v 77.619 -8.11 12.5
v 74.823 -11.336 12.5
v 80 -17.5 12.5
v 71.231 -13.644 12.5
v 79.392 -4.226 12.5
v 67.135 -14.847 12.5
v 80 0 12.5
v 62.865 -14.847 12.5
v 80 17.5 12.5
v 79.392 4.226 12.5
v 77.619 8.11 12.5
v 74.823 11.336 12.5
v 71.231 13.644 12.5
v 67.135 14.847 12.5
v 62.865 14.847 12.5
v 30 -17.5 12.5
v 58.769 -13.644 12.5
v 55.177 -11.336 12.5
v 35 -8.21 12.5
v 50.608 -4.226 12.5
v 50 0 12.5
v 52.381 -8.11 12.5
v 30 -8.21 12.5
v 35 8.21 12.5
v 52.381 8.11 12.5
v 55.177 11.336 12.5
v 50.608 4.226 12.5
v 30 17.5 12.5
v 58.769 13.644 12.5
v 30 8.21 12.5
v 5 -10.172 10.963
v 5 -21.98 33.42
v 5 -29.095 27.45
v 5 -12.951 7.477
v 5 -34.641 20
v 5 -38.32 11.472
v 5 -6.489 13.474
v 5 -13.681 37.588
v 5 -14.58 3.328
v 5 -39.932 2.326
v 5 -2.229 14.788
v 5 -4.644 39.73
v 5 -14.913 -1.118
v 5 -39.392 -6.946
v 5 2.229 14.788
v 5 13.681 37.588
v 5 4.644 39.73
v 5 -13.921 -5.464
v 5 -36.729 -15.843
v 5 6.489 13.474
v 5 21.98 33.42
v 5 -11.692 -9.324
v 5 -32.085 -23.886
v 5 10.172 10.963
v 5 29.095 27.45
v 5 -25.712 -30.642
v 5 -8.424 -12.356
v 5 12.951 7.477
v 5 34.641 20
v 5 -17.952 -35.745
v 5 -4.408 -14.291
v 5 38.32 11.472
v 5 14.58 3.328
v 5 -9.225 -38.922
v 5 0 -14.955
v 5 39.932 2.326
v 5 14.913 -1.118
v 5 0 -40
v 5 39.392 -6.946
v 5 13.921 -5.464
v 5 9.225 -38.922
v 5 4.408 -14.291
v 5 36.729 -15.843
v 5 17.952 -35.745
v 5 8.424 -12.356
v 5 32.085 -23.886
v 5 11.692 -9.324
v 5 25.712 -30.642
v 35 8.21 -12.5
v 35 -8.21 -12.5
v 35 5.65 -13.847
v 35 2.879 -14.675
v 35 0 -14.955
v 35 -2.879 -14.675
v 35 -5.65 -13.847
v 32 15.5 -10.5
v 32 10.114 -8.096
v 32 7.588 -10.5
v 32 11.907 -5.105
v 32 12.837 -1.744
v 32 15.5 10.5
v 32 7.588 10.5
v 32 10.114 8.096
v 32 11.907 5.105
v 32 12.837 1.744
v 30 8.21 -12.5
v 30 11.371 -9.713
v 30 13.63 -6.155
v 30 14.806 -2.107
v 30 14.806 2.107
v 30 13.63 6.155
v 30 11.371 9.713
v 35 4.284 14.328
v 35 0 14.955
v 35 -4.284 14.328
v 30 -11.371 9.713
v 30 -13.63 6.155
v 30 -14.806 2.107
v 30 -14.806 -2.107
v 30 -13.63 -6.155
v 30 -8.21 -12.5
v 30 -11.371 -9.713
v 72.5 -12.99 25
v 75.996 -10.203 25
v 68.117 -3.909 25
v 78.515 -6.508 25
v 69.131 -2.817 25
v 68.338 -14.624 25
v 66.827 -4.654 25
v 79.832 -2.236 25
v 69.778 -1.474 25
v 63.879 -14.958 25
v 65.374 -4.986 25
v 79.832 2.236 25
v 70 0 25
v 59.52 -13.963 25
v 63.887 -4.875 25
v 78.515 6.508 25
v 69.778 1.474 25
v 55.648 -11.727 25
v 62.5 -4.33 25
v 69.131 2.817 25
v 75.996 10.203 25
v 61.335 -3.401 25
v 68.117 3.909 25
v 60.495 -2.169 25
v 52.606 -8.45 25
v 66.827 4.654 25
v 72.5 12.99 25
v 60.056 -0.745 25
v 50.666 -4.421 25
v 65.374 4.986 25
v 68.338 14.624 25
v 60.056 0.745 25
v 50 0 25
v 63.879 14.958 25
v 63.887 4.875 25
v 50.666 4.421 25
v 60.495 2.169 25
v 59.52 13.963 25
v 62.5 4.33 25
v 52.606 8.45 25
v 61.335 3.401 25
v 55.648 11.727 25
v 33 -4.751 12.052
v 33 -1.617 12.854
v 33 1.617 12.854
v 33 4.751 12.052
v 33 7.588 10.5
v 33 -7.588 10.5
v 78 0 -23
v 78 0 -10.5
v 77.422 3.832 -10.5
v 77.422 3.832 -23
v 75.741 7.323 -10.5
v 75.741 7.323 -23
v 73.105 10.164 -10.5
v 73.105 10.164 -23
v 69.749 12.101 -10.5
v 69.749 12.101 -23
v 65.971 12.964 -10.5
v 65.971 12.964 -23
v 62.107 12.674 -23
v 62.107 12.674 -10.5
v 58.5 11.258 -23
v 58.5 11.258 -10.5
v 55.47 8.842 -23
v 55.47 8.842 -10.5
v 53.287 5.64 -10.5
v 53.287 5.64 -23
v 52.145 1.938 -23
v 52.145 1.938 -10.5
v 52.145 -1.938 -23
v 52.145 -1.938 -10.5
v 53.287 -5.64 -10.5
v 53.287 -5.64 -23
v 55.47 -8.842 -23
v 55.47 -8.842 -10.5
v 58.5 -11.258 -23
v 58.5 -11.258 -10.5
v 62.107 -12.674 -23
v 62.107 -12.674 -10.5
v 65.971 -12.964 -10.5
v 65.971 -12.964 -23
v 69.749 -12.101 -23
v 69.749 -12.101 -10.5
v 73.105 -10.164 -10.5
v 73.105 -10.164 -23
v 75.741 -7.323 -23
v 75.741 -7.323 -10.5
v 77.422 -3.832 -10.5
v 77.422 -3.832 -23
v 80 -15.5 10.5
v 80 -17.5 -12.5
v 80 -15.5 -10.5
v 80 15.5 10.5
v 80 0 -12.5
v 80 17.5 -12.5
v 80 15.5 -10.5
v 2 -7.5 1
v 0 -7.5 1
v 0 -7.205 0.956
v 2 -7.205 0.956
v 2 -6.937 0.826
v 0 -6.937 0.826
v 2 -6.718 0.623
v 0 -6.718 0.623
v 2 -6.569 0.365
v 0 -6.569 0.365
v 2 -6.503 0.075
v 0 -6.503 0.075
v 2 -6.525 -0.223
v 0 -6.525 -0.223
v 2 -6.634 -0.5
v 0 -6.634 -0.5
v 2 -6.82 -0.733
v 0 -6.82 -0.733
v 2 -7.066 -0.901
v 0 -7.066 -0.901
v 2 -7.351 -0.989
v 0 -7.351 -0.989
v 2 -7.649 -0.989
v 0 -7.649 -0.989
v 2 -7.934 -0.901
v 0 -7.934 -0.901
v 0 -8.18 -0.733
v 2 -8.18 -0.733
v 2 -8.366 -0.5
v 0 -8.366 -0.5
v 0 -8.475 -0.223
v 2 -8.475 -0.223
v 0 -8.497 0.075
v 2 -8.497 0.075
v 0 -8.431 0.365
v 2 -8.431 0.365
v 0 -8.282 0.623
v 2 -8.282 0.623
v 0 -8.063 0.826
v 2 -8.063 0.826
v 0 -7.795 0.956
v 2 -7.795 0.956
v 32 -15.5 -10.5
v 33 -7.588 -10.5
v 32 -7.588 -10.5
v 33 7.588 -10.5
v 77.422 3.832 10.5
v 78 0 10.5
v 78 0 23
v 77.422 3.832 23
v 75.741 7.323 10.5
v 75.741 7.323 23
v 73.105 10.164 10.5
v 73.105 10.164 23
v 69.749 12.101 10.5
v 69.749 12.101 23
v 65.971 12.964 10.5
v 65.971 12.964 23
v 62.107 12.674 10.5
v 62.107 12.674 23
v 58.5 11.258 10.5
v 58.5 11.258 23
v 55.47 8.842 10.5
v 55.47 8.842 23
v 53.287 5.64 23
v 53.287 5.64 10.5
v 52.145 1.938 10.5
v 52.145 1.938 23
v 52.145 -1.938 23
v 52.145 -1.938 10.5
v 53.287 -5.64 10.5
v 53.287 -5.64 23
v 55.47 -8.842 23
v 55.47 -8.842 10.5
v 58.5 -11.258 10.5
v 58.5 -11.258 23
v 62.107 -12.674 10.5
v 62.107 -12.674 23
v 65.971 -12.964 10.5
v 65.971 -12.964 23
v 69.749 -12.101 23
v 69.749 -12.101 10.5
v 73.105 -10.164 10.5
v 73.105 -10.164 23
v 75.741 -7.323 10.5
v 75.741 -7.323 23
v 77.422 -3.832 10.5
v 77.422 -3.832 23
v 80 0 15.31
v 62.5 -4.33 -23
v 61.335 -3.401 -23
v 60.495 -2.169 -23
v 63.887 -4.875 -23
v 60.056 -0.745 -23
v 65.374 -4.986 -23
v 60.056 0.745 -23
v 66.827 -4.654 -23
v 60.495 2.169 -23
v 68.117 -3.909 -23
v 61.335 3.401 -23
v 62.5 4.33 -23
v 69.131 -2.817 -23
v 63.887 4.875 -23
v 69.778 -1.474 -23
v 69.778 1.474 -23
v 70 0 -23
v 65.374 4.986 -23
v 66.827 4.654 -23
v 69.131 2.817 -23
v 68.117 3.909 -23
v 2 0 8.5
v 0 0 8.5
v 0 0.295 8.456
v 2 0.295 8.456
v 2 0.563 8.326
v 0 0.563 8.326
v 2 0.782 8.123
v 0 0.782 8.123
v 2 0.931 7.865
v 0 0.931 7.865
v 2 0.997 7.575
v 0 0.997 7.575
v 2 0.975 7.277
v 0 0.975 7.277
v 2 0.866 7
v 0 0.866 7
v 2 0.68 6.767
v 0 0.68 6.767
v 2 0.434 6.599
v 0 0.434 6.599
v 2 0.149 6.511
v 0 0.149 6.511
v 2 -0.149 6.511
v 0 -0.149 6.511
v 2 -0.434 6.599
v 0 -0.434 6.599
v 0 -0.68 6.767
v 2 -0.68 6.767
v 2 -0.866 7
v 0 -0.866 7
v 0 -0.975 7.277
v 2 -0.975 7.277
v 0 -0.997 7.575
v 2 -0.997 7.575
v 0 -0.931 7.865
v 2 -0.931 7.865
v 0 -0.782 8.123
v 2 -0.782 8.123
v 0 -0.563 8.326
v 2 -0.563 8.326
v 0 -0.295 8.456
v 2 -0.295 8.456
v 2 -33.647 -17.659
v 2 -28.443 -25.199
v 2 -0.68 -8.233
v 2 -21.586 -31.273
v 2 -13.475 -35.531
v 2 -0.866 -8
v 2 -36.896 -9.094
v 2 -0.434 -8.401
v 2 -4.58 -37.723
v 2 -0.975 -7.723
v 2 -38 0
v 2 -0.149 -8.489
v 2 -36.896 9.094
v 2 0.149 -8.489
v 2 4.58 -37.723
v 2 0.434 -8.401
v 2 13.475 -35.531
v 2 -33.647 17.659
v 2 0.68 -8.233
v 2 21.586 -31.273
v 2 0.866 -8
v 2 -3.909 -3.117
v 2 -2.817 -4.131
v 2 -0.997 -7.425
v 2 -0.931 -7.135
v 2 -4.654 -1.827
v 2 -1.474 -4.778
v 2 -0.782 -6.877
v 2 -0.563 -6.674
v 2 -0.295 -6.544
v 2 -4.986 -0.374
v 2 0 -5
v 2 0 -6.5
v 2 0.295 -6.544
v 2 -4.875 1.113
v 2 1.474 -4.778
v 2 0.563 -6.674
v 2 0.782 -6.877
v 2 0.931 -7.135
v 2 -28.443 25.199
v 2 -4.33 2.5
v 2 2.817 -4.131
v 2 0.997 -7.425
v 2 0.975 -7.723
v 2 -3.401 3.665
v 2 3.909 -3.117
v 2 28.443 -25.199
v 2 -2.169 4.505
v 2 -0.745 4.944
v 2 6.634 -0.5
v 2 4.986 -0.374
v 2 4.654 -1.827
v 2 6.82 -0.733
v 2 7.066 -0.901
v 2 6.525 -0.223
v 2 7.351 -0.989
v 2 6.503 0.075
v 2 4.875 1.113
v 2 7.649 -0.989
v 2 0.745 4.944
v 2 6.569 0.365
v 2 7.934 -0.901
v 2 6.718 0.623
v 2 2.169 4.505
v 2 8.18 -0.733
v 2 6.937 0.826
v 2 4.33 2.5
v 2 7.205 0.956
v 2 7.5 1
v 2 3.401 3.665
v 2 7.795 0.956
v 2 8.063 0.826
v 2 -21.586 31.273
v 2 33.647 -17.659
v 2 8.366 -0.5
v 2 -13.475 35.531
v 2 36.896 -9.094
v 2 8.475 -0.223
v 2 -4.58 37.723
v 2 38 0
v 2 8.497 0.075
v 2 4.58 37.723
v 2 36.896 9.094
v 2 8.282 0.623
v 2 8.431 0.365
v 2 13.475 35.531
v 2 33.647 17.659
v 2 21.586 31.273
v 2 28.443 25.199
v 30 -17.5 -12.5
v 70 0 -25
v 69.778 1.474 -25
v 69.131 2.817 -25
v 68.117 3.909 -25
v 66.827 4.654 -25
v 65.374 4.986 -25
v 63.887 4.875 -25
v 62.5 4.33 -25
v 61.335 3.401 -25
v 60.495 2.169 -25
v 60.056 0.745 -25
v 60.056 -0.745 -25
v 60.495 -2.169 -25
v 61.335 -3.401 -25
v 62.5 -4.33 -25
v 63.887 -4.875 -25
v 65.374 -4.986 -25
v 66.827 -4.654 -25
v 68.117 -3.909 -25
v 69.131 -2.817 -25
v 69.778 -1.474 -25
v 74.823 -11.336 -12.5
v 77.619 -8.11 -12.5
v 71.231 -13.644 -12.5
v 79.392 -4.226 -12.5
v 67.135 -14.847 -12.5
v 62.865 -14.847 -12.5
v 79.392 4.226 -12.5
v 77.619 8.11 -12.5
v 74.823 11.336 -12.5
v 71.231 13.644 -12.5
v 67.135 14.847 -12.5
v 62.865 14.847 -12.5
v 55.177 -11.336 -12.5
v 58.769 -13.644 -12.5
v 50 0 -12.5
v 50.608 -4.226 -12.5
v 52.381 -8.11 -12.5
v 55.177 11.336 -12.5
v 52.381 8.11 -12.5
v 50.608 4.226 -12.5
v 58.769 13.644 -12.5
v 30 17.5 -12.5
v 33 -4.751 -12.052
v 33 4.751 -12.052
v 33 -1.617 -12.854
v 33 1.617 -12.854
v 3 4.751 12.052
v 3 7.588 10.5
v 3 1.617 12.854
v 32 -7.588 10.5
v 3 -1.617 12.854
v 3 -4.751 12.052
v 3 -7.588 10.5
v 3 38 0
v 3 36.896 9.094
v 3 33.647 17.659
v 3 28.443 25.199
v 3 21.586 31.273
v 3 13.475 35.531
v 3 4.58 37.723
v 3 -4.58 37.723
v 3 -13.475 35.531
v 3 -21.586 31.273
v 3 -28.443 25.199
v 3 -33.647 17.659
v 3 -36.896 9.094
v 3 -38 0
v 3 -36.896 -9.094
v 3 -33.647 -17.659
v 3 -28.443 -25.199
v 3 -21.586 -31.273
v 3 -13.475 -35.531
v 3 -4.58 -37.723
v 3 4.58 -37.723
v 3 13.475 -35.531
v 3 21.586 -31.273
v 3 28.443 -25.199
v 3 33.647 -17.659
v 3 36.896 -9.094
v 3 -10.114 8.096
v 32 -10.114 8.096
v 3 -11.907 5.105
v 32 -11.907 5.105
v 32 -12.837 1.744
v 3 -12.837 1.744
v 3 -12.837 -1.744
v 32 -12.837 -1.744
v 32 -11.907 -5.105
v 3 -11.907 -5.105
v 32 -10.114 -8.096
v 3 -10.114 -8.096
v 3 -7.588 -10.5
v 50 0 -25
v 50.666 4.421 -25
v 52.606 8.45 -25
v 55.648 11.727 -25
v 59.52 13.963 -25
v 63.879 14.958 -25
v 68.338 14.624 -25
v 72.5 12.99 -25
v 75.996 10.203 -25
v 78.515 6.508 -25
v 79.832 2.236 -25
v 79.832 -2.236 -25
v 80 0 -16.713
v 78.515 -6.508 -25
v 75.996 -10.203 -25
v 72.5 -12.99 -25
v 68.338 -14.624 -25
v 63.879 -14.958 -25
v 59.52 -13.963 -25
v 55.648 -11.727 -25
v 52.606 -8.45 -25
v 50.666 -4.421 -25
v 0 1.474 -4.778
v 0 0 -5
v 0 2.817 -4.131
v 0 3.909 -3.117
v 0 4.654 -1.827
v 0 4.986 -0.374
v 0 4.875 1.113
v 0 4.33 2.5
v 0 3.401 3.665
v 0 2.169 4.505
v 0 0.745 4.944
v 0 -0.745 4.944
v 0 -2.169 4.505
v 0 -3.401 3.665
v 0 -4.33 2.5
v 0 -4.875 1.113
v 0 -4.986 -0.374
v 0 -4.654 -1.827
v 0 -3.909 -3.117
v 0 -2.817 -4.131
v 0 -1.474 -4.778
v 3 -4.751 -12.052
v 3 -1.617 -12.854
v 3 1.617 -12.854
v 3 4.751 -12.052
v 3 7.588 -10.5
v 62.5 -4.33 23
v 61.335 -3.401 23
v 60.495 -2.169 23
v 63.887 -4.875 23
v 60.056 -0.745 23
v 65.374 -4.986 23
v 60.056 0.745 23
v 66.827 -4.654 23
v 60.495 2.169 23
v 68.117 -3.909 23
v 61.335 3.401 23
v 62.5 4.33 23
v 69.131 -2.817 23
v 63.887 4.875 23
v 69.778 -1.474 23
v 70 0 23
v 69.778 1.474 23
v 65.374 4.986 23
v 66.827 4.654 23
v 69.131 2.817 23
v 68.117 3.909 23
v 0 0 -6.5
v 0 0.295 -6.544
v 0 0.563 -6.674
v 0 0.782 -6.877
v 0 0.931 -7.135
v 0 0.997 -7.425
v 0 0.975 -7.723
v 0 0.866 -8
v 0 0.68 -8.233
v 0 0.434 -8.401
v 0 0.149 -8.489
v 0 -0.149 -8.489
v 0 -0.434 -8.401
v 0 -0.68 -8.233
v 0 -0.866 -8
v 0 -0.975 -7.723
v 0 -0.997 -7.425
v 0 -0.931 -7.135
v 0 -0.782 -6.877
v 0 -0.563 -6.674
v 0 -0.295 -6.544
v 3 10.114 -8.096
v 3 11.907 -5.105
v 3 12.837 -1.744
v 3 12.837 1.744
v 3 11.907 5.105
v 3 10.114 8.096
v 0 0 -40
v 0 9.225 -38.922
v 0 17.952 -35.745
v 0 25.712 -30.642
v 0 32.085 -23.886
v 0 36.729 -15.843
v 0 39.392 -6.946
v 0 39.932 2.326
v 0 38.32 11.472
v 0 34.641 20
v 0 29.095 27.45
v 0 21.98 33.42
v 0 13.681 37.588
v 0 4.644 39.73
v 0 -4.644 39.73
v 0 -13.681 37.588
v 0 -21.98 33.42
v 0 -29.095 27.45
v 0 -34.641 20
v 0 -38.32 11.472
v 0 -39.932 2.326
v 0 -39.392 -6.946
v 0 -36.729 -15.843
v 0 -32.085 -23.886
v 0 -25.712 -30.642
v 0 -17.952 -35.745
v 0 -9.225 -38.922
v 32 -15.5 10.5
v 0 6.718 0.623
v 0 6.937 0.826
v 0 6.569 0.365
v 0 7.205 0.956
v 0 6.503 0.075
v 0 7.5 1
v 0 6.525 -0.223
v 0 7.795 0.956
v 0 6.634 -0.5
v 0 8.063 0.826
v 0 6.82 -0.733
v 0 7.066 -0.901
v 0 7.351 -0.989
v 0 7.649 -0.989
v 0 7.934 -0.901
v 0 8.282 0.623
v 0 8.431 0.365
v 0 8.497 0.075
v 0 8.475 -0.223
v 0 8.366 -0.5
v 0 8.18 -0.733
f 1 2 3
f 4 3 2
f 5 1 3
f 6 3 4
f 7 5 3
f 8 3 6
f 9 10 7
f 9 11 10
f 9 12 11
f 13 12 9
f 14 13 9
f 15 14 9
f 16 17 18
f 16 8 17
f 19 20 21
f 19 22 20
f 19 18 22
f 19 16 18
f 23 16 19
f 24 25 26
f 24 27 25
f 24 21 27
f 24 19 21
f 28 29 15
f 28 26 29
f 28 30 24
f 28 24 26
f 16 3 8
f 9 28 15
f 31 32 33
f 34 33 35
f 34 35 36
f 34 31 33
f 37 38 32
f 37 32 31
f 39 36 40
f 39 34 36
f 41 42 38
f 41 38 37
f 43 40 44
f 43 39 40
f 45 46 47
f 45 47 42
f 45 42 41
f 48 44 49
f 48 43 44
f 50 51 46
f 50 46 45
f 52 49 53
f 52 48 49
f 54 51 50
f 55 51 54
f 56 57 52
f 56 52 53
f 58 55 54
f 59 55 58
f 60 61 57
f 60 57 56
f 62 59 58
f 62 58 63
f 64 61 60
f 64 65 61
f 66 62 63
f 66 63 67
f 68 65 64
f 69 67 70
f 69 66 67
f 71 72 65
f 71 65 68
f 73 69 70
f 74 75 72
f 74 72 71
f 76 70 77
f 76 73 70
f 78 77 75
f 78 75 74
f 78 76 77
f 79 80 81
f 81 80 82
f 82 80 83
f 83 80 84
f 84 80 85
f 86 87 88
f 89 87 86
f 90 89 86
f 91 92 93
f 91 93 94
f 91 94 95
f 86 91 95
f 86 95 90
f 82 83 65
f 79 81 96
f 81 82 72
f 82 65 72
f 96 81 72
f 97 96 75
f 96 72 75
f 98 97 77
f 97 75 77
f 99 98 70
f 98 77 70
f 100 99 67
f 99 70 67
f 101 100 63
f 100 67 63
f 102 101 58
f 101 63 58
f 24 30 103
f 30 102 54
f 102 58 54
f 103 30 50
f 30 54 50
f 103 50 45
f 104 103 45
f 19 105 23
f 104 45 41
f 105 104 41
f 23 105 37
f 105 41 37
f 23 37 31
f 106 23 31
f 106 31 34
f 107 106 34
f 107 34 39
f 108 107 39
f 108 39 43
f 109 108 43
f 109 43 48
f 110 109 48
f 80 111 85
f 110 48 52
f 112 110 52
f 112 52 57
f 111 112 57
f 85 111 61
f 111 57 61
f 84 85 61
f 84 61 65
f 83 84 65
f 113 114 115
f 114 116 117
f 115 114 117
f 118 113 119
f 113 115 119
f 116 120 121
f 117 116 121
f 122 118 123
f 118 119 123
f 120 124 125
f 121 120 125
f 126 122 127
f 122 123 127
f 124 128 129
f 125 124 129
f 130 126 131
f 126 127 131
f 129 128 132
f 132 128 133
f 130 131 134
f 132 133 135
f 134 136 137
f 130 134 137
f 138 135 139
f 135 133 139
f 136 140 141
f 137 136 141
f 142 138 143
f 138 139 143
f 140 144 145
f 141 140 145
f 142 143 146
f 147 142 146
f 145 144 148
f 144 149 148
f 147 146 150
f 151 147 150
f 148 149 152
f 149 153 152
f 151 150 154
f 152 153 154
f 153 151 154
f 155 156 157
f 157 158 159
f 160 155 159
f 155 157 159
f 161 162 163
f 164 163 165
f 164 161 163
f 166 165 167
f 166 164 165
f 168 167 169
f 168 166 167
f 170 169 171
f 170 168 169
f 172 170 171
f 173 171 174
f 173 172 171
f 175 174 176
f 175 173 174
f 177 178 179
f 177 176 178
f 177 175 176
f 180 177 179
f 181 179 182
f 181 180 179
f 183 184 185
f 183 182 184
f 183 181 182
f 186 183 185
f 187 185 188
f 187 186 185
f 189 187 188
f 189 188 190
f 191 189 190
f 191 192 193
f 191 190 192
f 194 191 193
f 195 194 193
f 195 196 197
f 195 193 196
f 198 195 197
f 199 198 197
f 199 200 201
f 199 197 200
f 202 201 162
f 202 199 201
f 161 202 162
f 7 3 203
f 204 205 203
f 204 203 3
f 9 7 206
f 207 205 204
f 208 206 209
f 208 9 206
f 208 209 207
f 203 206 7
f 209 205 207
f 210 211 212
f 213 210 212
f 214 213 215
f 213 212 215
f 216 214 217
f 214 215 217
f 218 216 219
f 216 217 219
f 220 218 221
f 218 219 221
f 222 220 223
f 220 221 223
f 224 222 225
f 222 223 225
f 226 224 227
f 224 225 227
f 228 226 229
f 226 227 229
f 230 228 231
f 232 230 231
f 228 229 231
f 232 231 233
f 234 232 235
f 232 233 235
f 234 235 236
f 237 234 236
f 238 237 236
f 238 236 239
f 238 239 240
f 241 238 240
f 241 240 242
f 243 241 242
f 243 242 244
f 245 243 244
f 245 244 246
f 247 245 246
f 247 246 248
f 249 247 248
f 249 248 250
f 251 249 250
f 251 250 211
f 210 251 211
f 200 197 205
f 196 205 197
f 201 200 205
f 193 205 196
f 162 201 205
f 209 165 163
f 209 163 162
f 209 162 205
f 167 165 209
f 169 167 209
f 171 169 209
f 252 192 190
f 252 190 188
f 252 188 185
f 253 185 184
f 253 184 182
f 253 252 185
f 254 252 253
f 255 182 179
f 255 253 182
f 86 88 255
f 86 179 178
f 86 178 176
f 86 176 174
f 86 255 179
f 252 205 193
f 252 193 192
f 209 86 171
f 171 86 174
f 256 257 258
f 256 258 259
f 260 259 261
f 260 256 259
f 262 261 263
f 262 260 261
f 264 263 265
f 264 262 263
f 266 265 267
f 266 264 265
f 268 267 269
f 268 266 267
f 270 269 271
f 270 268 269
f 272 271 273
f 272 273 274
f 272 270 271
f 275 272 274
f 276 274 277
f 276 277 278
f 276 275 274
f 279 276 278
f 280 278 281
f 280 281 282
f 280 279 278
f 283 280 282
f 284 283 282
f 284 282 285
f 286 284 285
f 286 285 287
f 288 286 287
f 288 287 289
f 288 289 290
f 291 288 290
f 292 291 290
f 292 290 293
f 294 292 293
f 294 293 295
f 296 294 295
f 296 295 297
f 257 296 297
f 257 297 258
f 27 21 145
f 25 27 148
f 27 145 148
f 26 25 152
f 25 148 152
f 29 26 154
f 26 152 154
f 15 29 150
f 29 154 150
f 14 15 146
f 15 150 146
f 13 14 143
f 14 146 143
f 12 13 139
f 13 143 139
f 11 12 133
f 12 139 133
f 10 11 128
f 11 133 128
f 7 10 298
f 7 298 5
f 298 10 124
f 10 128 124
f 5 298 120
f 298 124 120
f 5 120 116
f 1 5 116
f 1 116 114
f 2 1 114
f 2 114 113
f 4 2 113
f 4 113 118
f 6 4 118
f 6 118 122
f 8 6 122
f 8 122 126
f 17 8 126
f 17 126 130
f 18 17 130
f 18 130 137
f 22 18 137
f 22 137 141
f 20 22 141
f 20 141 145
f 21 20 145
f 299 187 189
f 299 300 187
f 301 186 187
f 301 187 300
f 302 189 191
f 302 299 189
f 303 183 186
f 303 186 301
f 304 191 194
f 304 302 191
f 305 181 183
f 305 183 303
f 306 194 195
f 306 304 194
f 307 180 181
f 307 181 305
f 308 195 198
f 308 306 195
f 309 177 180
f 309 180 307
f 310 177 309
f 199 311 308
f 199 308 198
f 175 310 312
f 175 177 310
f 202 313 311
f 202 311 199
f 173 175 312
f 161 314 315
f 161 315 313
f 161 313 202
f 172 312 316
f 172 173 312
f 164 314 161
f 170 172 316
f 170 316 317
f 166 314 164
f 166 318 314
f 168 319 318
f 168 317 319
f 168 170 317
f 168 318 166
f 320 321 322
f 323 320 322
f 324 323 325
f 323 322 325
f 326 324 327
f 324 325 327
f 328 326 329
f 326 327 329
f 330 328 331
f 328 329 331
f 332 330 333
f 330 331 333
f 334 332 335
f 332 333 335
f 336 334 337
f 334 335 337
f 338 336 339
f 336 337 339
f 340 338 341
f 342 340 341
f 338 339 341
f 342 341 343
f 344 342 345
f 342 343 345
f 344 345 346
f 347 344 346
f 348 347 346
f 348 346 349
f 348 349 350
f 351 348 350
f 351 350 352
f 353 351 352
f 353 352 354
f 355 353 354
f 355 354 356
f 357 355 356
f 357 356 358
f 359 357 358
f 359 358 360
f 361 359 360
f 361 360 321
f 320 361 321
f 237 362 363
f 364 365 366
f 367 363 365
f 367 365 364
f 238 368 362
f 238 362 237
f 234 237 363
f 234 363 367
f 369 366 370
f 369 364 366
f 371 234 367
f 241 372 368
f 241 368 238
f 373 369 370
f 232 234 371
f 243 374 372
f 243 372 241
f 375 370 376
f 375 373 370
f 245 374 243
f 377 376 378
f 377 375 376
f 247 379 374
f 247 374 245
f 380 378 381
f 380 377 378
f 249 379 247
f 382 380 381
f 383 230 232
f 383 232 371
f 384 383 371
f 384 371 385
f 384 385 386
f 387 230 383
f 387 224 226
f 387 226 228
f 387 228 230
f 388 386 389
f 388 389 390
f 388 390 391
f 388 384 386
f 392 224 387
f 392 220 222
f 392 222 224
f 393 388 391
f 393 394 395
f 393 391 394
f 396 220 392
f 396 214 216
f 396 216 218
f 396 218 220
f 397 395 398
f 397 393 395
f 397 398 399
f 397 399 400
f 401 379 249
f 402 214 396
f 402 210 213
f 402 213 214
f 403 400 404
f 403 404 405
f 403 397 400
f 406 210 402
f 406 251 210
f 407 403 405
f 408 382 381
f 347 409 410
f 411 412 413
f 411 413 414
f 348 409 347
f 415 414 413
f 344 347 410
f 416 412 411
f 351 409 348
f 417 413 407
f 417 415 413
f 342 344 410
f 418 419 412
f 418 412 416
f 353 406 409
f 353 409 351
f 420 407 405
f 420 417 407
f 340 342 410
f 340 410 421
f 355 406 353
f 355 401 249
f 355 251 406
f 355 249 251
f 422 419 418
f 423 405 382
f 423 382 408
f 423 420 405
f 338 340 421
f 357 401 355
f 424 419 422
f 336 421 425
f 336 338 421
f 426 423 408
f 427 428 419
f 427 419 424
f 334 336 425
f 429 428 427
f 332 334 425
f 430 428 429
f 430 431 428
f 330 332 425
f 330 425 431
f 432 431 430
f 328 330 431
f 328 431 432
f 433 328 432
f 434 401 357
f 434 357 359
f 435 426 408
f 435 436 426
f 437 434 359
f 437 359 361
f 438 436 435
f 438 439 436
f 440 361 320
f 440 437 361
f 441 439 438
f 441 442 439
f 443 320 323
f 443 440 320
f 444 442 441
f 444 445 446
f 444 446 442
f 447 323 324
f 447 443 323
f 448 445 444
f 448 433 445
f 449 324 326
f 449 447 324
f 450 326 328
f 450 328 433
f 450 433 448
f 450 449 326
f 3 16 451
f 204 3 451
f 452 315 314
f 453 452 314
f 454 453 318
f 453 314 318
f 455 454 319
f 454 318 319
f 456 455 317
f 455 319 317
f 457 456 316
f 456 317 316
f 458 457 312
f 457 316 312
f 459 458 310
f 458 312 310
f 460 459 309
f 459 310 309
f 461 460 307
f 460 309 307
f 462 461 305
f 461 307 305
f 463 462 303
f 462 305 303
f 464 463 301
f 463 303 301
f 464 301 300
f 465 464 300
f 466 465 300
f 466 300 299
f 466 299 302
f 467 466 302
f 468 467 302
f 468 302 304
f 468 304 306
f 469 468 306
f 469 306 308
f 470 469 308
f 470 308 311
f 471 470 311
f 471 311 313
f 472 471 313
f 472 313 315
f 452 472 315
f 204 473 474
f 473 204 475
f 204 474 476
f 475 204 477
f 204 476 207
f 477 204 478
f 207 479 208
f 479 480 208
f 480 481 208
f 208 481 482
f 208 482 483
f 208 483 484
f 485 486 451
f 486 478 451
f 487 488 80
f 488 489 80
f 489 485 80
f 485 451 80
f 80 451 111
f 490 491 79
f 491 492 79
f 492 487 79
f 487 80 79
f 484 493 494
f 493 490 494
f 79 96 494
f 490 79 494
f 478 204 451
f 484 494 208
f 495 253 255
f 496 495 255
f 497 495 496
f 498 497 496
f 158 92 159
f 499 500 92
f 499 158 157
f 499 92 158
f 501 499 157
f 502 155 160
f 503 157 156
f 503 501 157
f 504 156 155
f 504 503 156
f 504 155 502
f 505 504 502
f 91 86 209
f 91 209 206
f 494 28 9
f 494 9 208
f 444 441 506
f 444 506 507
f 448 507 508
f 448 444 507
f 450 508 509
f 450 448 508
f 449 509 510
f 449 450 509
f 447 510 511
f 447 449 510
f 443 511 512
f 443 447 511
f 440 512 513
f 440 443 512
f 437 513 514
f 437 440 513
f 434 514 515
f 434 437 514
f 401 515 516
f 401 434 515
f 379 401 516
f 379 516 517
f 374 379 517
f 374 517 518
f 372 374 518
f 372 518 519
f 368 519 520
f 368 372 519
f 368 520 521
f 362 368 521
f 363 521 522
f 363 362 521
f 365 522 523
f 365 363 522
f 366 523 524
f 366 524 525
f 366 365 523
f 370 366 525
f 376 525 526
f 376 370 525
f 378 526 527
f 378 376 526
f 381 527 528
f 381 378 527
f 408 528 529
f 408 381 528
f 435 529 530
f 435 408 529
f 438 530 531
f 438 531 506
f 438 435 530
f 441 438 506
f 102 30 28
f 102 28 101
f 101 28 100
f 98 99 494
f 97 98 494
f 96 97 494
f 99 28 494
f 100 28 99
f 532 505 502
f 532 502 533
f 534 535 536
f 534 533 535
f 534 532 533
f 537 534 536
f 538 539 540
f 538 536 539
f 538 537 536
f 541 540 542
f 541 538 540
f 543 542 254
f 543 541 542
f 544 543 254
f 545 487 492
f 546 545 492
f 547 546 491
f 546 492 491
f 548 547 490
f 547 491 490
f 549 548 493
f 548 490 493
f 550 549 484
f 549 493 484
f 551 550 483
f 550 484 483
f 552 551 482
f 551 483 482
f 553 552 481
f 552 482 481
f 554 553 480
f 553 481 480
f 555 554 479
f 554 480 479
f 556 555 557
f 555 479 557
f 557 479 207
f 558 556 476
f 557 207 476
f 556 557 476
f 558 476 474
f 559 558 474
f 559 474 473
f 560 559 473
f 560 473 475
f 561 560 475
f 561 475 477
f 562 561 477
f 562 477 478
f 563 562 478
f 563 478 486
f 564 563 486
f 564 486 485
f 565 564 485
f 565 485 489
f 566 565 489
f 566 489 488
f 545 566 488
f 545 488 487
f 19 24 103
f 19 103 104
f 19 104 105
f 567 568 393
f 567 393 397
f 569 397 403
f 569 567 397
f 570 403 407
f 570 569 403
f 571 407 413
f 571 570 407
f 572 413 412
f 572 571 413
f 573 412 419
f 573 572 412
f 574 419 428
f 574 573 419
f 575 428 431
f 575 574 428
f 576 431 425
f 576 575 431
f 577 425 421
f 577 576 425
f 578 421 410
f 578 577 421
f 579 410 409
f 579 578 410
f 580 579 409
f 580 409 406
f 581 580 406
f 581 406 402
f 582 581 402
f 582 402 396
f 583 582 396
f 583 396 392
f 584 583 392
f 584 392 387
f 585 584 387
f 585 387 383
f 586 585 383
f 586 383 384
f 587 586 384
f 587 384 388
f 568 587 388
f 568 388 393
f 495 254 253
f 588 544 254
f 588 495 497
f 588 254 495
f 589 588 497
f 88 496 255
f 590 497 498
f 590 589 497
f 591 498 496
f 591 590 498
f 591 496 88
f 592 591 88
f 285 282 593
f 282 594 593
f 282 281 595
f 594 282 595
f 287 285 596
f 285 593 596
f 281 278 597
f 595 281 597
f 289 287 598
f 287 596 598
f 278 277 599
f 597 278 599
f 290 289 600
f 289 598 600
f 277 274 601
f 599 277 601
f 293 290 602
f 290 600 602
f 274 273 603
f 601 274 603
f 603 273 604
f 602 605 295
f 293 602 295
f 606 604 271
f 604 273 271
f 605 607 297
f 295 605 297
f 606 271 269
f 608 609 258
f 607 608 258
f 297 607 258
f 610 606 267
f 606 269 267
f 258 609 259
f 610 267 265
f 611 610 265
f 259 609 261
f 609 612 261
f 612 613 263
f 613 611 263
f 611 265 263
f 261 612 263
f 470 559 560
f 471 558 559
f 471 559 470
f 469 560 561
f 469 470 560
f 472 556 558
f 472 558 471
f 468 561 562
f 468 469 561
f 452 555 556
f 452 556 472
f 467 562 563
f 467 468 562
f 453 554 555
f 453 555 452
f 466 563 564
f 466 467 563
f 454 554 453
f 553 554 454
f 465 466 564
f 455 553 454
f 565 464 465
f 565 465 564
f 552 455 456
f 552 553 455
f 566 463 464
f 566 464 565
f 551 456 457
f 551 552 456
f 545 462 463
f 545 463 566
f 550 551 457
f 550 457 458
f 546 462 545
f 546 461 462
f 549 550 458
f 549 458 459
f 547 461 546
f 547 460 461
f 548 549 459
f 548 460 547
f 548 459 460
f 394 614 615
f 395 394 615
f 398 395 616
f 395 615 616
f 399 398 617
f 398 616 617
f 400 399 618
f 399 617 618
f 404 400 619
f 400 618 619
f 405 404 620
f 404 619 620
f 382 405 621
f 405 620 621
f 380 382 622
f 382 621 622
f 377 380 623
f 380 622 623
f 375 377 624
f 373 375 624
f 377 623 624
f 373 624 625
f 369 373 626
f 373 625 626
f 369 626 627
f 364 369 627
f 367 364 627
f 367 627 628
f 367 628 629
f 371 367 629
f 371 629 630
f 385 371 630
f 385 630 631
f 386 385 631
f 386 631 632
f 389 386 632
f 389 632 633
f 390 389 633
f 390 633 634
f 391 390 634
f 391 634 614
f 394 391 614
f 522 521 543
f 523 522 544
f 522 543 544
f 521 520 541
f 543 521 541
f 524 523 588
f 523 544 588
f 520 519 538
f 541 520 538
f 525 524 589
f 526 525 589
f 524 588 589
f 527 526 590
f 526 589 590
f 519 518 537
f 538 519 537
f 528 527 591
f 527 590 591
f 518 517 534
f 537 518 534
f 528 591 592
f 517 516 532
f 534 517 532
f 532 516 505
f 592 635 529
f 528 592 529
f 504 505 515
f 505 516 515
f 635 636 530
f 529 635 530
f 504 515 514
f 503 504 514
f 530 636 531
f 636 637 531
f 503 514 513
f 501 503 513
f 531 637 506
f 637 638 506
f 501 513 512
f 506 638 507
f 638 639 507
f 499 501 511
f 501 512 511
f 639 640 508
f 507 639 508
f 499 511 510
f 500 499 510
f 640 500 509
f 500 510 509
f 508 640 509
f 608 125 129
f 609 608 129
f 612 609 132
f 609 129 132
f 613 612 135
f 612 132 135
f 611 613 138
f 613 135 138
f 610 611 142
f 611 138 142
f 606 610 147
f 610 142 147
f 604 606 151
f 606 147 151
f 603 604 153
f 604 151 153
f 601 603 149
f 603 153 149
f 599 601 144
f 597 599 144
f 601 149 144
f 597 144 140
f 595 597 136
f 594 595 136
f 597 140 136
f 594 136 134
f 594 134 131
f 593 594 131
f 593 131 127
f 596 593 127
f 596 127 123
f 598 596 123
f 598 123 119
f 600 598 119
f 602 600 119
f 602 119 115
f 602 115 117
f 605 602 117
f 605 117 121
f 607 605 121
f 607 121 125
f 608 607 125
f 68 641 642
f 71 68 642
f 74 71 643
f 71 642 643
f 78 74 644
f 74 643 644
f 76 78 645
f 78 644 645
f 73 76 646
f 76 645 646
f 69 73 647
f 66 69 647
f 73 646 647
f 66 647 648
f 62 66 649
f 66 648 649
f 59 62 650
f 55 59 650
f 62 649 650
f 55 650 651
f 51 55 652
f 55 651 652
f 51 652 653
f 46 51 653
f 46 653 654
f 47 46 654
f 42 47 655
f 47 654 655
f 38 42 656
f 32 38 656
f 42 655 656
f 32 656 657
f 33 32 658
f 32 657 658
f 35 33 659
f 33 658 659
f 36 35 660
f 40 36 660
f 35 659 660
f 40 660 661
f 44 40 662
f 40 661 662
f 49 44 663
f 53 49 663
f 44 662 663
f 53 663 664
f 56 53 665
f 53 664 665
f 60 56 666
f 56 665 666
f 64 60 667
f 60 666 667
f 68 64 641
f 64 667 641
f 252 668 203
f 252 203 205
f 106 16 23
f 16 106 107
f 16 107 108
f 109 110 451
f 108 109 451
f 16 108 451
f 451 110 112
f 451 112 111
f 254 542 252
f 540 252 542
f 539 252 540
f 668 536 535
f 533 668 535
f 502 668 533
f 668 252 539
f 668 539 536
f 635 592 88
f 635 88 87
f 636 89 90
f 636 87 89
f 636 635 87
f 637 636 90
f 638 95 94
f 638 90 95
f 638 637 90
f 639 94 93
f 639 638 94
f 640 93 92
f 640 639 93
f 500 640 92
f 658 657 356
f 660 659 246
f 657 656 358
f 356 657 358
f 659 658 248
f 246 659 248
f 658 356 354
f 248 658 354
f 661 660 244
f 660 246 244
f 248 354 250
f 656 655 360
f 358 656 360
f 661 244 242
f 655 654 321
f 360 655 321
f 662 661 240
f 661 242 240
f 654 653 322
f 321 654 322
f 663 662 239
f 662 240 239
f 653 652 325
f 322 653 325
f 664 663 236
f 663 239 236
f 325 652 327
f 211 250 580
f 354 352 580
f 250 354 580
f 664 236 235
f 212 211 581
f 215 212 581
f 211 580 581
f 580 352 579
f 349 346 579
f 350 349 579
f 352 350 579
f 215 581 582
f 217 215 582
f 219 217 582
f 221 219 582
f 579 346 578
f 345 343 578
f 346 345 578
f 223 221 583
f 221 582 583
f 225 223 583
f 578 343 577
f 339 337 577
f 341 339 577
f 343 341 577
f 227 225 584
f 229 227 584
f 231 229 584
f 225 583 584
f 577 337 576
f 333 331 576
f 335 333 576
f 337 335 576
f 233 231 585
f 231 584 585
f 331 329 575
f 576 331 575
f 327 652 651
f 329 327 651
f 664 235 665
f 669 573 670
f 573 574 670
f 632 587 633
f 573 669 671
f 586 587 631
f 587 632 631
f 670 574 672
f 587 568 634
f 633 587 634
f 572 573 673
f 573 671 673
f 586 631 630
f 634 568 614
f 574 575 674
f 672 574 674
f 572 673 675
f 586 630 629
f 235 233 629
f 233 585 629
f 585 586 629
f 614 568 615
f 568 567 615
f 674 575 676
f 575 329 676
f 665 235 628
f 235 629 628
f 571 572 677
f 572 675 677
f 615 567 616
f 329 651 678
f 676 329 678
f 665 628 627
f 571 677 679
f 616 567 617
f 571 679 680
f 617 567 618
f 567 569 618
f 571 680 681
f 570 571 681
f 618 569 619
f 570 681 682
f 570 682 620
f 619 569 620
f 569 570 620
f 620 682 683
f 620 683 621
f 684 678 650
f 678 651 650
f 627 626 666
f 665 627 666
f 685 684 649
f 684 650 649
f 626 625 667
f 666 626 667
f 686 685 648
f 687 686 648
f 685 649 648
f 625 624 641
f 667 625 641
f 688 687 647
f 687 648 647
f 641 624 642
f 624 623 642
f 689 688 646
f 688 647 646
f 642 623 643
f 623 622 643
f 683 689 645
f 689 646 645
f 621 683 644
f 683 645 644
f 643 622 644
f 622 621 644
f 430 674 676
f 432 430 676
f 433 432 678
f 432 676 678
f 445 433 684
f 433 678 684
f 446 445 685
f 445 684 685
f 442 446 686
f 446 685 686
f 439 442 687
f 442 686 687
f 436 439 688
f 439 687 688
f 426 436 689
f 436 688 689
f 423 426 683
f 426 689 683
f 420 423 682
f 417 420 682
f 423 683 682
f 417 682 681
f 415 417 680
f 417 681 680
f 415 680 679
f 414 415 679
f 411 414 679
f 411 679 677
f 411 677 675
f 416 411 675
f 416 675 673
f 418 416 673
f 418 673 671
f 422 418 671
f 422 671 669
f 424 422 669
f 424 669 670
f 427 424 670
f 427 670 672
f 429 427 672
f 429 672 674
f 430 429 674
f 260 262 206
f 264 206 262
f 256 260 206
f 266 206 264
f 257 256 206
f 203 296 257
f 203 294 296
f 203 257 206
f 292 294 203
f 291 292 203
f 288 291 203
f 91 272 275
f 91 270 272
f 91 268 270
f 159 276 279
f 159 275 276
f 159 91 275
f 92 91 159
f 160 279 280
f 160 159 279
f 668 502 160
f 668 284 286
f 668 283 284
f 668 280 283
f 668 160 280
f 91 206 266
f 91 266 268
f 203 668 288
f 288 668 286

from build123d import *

# Parameters (mm, degrees)
SKETCH1_R                = 40
SKETCH1_R_2              = 5
BOSS_EXTRUDE1_DEPTH      = 5
SKETCH2_R                = 14.954923049
SKETCH2_R_2              = 5
BOSS_EXTRUDE2_DEPTH      = 30
SKETCH3_W                = 25
SKETCH3_H                = 35
BOSS_EXTRUDE3_DEPTH      = 65
BOSS_EXTRUDE4_DEPTH      = 12.5
BOSS_EXTRUDE4_DEPTH_BACK = 37.5
SKETCH4_R                = 15
SKETCH9_R                = 5
CUT_EXTRUDE5_DEPTH       = 111.566721937
SHELL14_START            = 2
SHELL14_OUTLINE_R        = 5
SHELL14_DEPTH            = 91
SHELL14_START_2          = 32
SHELL14_2_DEPTH          = 61
SHELL14_3_OUTLINE_R      = 38
SHELL14_3_DEPTH          = 1
SHELL14_START_3          = 3
SHELL14_4_DEPTH          = 30
SHELL14_START_4          = -23
SHELL14_5_OUTLINE_R      = 13
SHELL14_5_DEPTH          = 46
SKETCH11_R               = 1
CUT_EXTRUDE6_DEPTH       = 5
SKETCH10_R               = 5
CUT_EXTRUDE7_DEPTH       = 122.86057607
SKETCH12_W               = 25
SKETCH12_H               = 35
CUT_EXTRUDE8_DEPTH       = 2
SKETCH16_W               = 32.02314812
SKETCH16_H               = 50.956542264
CUT_EXTRUDE9_DEPTH       = 13


with BuildPart() as part:
    # Sketch1 → Boss-Extrude1 (new body)
    with BuildSketch(Plane(origin=(0, 0, 0), x_dir=(0, 0, -1), z_dir=(1, 0, 0))):
        Circle(SKETCH1_R)
        Circle(SKETCH1_R_2, mode=Mode.SUBTRACT)
    extrude(amount=BOSS_EXTRUDE1_DEPTH)

    # Sketch2 → Boss-Extrude2 (add)
    with BuildSketch(Plane(origin=(5, 0, 0), x_dir=(0, 0, -1), z_dir=(1, 0, 0))):
        Circle(SKETCH2_R)
        Circle(SKETCH2_R_2, mode=Mode.SUBTRACT)
    extrude(amount=BOSS_EXTRUDE2_DEPTH)

    # Sketch3 → Boss-Extrude3 (add)
    with BuildSketch(Plane(origin=(30, 0, 0), x_dir=(0, 0, -1), z_dir=(1, 0, 0))):
        Rectangle(SKETCH3_W, SKETCH3_H)
    extrude(amount=BOSS_EXTRUDE3_DEPTH)

    # Sketch4 → Boss-Extrude4 (add, two sides: drawn at the far end of the back side and taken through both)
    with BuildSketch(Plane(origin=(0, 0, -12.5), x_dir=(-1, 0, 0), z_dir=(0, 0, -1)).offset(-BOSS_EXTRUDE4_DEPTH_BACK)):
        with Locations((-65, 0)):
            Circle(SKETCH4_R)
    extrude(amount=BOSS_EXTRUDE4_DEPTH + BOSS_EXTRUDE4_DEPTH_BACK)

    # Sketch9 → Cut-Extrude5 (cut, through all)
    with BuildSketch(Plane.ZY):
        Circle(SKETCH9_R)
    extrude(amount=-CUT_EXTRUDE5_DEPTH, mode=Mode.SUBTRACT)

    # Shell14: read off the stored shape, not the designer's step
    # Shell14 outline → Shell14 (cut)
    with BuildSketch(Plane.YZ.offset(SHELL14_START)):
        with BuildLine():
            ThreePointArc((7.588150711, -10.5), (12.954923049, 0), (7.588150711, 10.5))
            Line((7.588150711, 10.5), (-7.588150711, 10.5))
            ThreePointArc((-7.588150711, 10.5), (-12.954923049, 0), (-7.588150711, -10.5))
            Line((-7.588150711, -10.5), (7.588150711, -10.5))
        make_face()
        Circle(SHELL14_OUTLINE_R, mode=Mode.SUBTRACT)
    extrude(amount=SHELL14_DEPTH, mode=Mode.SUBTRACT)

    # Shell14 2 outline → Shell14 2 (cut)
    with BuildSketch(Plane.YZ.offset(SHELL14_START_2)):
        with BuildLine():
            ThreePointArc((7.588150711, 10.5), (12.954923049, 0), (7.588150711, -10.5))
            Line((7.588150711, -10.5), (15.5, -10.5))
            Line((15.5, -10.5), (15.5, 10.5))
            Line((15.5, 10.5), (7.588150711, 10.5))
        make_face()
        with BuildLine():
            ThreePointArc((-7.588150711, -10.5), (-12.954923049, 0), (-7.588150711, 10.5))
            Line((-7.588150711, 10.5), (-15.5, 10.5))
            Line((-15.5, 10.5), (-15.5, -10.5))
            Line((-15.5, -10.5), (-7.588150711, -10.5))
        make_face()
    extrude(amount=SHELL14_2_DEPTH, mode=Mode.SUBTRACT)

    # Shell14 3 outline → Shell14 3 (cut)
    with BuildSketch(Plane.YZ.offset(SHELL14_START)):
        Circle(SHELL14_3_OUTLINE_R)
        with BuildLine():
            ThreePointArc((7.588150711, 10.5), (12.954923049, 0), (7.588150711, -10.5))
            Line((7.588150711, -10.5), (-7.588150711, -10.5))
            ThreePointArc((-7.588150711, -10.5), (-12.954923049, 0), (-7.588150711, 10.5))
            Line((-7.588150711, 10.5), (7.588150711, 10.5))
        make_face(mode=Mode.SUBTRACT)
    extrude(amount=SHELL14_3_DEPTH, mode=Mode.SUBTRACT)

    # Shell14 4 outline → Shell14 4 (cut)
    with BuildSketch(Plane.YZ.offset(SHELL14_START_3)):
        with BuildLine():
            Line((-7.588150711, 10.5), (7.588150711, 10.5))
            ThreePointArc((7.588150711, 10.5), (0, 12.954923049), (-7.588150711, 10.5))
        make_face()
        with BuildLine():
            ThreePointArc((-7.588150711, -10.5), (0, -12.954923049), (7.588150711, -10.5))
            Line((7.588150711, -10.5), (-7.588150711, -10.5))
        make_face()
    extrude(amount=SHELL14_4_DEPTH, mode=Mode.SUBTRACT)

    # Shell14 5 outline → Shell14 5 (cut)
    with BuildSketch(Plane.XY.offset(SHELL14_START_4)):
        with Locations((65, 0)):
            Circle(SHELL14_5_OUTLINE_R)
    extrude(amount=SHELL14_5_DEPTH, mode=Mode.SUBTRACT)

    # Sketch11 → Cut-Extrude6 (cut)
    with BuildSketch(Plane.ZY):
        with Locations((0, 7.5)):
            Circle(SKETCH11_R)
        with Locations((7.5, 0)):
            Circle(SKETCH11_R)
        with Locations((0, -7.5)):
            Circle(SKETCH11_R)
        with Locations((-7.5, 0)):
            Circle(SKETCH11_R)
    extrude(amount=-CUT_EXTRUDE6_DEPTH, mode=Mode.SUBTRACT)

    # Sketch10 → Cut-Extrude7 (cut, through all)
    with BuildSketch(Plane.XY.offset(25)):
        with Locations((65, 0)):
            Circle(SKETCH10_R)
    extrude(amount=-CUT_EXTRUDE7_DEPTH, mode=Mode.SUBTRACT)

    # Sketch12 → Cut-Extrude8 (cut)
    with BuildSketch(Plane(origin=(95, 0, 0), x_dir=(0, 0, -1), z_dir=(1, 0, 0))):
        Rectangle(SKETCH12_W, SKETCH12_H)
    extrude(amount=-CUT_EXTRUDE8_DEPTH, mode=Mode.SUBTRACT)

    # Sketch16 → Cut-Extrude9 (cut)
    with BuildSketch(Plane(origin=(93, 0, 0), x_dir=(0, 0, -1), z_dir=(1, 0, 0))):
        with Locations((0.70123682, -2.512765272)):
            Rectangle(SKETCH16_W, SKETCH16_H)
    extrude(amount=-CUT_EXTRUDE9_DEPTH, mode=Mode.SUBTRACT)


solid = part.part
